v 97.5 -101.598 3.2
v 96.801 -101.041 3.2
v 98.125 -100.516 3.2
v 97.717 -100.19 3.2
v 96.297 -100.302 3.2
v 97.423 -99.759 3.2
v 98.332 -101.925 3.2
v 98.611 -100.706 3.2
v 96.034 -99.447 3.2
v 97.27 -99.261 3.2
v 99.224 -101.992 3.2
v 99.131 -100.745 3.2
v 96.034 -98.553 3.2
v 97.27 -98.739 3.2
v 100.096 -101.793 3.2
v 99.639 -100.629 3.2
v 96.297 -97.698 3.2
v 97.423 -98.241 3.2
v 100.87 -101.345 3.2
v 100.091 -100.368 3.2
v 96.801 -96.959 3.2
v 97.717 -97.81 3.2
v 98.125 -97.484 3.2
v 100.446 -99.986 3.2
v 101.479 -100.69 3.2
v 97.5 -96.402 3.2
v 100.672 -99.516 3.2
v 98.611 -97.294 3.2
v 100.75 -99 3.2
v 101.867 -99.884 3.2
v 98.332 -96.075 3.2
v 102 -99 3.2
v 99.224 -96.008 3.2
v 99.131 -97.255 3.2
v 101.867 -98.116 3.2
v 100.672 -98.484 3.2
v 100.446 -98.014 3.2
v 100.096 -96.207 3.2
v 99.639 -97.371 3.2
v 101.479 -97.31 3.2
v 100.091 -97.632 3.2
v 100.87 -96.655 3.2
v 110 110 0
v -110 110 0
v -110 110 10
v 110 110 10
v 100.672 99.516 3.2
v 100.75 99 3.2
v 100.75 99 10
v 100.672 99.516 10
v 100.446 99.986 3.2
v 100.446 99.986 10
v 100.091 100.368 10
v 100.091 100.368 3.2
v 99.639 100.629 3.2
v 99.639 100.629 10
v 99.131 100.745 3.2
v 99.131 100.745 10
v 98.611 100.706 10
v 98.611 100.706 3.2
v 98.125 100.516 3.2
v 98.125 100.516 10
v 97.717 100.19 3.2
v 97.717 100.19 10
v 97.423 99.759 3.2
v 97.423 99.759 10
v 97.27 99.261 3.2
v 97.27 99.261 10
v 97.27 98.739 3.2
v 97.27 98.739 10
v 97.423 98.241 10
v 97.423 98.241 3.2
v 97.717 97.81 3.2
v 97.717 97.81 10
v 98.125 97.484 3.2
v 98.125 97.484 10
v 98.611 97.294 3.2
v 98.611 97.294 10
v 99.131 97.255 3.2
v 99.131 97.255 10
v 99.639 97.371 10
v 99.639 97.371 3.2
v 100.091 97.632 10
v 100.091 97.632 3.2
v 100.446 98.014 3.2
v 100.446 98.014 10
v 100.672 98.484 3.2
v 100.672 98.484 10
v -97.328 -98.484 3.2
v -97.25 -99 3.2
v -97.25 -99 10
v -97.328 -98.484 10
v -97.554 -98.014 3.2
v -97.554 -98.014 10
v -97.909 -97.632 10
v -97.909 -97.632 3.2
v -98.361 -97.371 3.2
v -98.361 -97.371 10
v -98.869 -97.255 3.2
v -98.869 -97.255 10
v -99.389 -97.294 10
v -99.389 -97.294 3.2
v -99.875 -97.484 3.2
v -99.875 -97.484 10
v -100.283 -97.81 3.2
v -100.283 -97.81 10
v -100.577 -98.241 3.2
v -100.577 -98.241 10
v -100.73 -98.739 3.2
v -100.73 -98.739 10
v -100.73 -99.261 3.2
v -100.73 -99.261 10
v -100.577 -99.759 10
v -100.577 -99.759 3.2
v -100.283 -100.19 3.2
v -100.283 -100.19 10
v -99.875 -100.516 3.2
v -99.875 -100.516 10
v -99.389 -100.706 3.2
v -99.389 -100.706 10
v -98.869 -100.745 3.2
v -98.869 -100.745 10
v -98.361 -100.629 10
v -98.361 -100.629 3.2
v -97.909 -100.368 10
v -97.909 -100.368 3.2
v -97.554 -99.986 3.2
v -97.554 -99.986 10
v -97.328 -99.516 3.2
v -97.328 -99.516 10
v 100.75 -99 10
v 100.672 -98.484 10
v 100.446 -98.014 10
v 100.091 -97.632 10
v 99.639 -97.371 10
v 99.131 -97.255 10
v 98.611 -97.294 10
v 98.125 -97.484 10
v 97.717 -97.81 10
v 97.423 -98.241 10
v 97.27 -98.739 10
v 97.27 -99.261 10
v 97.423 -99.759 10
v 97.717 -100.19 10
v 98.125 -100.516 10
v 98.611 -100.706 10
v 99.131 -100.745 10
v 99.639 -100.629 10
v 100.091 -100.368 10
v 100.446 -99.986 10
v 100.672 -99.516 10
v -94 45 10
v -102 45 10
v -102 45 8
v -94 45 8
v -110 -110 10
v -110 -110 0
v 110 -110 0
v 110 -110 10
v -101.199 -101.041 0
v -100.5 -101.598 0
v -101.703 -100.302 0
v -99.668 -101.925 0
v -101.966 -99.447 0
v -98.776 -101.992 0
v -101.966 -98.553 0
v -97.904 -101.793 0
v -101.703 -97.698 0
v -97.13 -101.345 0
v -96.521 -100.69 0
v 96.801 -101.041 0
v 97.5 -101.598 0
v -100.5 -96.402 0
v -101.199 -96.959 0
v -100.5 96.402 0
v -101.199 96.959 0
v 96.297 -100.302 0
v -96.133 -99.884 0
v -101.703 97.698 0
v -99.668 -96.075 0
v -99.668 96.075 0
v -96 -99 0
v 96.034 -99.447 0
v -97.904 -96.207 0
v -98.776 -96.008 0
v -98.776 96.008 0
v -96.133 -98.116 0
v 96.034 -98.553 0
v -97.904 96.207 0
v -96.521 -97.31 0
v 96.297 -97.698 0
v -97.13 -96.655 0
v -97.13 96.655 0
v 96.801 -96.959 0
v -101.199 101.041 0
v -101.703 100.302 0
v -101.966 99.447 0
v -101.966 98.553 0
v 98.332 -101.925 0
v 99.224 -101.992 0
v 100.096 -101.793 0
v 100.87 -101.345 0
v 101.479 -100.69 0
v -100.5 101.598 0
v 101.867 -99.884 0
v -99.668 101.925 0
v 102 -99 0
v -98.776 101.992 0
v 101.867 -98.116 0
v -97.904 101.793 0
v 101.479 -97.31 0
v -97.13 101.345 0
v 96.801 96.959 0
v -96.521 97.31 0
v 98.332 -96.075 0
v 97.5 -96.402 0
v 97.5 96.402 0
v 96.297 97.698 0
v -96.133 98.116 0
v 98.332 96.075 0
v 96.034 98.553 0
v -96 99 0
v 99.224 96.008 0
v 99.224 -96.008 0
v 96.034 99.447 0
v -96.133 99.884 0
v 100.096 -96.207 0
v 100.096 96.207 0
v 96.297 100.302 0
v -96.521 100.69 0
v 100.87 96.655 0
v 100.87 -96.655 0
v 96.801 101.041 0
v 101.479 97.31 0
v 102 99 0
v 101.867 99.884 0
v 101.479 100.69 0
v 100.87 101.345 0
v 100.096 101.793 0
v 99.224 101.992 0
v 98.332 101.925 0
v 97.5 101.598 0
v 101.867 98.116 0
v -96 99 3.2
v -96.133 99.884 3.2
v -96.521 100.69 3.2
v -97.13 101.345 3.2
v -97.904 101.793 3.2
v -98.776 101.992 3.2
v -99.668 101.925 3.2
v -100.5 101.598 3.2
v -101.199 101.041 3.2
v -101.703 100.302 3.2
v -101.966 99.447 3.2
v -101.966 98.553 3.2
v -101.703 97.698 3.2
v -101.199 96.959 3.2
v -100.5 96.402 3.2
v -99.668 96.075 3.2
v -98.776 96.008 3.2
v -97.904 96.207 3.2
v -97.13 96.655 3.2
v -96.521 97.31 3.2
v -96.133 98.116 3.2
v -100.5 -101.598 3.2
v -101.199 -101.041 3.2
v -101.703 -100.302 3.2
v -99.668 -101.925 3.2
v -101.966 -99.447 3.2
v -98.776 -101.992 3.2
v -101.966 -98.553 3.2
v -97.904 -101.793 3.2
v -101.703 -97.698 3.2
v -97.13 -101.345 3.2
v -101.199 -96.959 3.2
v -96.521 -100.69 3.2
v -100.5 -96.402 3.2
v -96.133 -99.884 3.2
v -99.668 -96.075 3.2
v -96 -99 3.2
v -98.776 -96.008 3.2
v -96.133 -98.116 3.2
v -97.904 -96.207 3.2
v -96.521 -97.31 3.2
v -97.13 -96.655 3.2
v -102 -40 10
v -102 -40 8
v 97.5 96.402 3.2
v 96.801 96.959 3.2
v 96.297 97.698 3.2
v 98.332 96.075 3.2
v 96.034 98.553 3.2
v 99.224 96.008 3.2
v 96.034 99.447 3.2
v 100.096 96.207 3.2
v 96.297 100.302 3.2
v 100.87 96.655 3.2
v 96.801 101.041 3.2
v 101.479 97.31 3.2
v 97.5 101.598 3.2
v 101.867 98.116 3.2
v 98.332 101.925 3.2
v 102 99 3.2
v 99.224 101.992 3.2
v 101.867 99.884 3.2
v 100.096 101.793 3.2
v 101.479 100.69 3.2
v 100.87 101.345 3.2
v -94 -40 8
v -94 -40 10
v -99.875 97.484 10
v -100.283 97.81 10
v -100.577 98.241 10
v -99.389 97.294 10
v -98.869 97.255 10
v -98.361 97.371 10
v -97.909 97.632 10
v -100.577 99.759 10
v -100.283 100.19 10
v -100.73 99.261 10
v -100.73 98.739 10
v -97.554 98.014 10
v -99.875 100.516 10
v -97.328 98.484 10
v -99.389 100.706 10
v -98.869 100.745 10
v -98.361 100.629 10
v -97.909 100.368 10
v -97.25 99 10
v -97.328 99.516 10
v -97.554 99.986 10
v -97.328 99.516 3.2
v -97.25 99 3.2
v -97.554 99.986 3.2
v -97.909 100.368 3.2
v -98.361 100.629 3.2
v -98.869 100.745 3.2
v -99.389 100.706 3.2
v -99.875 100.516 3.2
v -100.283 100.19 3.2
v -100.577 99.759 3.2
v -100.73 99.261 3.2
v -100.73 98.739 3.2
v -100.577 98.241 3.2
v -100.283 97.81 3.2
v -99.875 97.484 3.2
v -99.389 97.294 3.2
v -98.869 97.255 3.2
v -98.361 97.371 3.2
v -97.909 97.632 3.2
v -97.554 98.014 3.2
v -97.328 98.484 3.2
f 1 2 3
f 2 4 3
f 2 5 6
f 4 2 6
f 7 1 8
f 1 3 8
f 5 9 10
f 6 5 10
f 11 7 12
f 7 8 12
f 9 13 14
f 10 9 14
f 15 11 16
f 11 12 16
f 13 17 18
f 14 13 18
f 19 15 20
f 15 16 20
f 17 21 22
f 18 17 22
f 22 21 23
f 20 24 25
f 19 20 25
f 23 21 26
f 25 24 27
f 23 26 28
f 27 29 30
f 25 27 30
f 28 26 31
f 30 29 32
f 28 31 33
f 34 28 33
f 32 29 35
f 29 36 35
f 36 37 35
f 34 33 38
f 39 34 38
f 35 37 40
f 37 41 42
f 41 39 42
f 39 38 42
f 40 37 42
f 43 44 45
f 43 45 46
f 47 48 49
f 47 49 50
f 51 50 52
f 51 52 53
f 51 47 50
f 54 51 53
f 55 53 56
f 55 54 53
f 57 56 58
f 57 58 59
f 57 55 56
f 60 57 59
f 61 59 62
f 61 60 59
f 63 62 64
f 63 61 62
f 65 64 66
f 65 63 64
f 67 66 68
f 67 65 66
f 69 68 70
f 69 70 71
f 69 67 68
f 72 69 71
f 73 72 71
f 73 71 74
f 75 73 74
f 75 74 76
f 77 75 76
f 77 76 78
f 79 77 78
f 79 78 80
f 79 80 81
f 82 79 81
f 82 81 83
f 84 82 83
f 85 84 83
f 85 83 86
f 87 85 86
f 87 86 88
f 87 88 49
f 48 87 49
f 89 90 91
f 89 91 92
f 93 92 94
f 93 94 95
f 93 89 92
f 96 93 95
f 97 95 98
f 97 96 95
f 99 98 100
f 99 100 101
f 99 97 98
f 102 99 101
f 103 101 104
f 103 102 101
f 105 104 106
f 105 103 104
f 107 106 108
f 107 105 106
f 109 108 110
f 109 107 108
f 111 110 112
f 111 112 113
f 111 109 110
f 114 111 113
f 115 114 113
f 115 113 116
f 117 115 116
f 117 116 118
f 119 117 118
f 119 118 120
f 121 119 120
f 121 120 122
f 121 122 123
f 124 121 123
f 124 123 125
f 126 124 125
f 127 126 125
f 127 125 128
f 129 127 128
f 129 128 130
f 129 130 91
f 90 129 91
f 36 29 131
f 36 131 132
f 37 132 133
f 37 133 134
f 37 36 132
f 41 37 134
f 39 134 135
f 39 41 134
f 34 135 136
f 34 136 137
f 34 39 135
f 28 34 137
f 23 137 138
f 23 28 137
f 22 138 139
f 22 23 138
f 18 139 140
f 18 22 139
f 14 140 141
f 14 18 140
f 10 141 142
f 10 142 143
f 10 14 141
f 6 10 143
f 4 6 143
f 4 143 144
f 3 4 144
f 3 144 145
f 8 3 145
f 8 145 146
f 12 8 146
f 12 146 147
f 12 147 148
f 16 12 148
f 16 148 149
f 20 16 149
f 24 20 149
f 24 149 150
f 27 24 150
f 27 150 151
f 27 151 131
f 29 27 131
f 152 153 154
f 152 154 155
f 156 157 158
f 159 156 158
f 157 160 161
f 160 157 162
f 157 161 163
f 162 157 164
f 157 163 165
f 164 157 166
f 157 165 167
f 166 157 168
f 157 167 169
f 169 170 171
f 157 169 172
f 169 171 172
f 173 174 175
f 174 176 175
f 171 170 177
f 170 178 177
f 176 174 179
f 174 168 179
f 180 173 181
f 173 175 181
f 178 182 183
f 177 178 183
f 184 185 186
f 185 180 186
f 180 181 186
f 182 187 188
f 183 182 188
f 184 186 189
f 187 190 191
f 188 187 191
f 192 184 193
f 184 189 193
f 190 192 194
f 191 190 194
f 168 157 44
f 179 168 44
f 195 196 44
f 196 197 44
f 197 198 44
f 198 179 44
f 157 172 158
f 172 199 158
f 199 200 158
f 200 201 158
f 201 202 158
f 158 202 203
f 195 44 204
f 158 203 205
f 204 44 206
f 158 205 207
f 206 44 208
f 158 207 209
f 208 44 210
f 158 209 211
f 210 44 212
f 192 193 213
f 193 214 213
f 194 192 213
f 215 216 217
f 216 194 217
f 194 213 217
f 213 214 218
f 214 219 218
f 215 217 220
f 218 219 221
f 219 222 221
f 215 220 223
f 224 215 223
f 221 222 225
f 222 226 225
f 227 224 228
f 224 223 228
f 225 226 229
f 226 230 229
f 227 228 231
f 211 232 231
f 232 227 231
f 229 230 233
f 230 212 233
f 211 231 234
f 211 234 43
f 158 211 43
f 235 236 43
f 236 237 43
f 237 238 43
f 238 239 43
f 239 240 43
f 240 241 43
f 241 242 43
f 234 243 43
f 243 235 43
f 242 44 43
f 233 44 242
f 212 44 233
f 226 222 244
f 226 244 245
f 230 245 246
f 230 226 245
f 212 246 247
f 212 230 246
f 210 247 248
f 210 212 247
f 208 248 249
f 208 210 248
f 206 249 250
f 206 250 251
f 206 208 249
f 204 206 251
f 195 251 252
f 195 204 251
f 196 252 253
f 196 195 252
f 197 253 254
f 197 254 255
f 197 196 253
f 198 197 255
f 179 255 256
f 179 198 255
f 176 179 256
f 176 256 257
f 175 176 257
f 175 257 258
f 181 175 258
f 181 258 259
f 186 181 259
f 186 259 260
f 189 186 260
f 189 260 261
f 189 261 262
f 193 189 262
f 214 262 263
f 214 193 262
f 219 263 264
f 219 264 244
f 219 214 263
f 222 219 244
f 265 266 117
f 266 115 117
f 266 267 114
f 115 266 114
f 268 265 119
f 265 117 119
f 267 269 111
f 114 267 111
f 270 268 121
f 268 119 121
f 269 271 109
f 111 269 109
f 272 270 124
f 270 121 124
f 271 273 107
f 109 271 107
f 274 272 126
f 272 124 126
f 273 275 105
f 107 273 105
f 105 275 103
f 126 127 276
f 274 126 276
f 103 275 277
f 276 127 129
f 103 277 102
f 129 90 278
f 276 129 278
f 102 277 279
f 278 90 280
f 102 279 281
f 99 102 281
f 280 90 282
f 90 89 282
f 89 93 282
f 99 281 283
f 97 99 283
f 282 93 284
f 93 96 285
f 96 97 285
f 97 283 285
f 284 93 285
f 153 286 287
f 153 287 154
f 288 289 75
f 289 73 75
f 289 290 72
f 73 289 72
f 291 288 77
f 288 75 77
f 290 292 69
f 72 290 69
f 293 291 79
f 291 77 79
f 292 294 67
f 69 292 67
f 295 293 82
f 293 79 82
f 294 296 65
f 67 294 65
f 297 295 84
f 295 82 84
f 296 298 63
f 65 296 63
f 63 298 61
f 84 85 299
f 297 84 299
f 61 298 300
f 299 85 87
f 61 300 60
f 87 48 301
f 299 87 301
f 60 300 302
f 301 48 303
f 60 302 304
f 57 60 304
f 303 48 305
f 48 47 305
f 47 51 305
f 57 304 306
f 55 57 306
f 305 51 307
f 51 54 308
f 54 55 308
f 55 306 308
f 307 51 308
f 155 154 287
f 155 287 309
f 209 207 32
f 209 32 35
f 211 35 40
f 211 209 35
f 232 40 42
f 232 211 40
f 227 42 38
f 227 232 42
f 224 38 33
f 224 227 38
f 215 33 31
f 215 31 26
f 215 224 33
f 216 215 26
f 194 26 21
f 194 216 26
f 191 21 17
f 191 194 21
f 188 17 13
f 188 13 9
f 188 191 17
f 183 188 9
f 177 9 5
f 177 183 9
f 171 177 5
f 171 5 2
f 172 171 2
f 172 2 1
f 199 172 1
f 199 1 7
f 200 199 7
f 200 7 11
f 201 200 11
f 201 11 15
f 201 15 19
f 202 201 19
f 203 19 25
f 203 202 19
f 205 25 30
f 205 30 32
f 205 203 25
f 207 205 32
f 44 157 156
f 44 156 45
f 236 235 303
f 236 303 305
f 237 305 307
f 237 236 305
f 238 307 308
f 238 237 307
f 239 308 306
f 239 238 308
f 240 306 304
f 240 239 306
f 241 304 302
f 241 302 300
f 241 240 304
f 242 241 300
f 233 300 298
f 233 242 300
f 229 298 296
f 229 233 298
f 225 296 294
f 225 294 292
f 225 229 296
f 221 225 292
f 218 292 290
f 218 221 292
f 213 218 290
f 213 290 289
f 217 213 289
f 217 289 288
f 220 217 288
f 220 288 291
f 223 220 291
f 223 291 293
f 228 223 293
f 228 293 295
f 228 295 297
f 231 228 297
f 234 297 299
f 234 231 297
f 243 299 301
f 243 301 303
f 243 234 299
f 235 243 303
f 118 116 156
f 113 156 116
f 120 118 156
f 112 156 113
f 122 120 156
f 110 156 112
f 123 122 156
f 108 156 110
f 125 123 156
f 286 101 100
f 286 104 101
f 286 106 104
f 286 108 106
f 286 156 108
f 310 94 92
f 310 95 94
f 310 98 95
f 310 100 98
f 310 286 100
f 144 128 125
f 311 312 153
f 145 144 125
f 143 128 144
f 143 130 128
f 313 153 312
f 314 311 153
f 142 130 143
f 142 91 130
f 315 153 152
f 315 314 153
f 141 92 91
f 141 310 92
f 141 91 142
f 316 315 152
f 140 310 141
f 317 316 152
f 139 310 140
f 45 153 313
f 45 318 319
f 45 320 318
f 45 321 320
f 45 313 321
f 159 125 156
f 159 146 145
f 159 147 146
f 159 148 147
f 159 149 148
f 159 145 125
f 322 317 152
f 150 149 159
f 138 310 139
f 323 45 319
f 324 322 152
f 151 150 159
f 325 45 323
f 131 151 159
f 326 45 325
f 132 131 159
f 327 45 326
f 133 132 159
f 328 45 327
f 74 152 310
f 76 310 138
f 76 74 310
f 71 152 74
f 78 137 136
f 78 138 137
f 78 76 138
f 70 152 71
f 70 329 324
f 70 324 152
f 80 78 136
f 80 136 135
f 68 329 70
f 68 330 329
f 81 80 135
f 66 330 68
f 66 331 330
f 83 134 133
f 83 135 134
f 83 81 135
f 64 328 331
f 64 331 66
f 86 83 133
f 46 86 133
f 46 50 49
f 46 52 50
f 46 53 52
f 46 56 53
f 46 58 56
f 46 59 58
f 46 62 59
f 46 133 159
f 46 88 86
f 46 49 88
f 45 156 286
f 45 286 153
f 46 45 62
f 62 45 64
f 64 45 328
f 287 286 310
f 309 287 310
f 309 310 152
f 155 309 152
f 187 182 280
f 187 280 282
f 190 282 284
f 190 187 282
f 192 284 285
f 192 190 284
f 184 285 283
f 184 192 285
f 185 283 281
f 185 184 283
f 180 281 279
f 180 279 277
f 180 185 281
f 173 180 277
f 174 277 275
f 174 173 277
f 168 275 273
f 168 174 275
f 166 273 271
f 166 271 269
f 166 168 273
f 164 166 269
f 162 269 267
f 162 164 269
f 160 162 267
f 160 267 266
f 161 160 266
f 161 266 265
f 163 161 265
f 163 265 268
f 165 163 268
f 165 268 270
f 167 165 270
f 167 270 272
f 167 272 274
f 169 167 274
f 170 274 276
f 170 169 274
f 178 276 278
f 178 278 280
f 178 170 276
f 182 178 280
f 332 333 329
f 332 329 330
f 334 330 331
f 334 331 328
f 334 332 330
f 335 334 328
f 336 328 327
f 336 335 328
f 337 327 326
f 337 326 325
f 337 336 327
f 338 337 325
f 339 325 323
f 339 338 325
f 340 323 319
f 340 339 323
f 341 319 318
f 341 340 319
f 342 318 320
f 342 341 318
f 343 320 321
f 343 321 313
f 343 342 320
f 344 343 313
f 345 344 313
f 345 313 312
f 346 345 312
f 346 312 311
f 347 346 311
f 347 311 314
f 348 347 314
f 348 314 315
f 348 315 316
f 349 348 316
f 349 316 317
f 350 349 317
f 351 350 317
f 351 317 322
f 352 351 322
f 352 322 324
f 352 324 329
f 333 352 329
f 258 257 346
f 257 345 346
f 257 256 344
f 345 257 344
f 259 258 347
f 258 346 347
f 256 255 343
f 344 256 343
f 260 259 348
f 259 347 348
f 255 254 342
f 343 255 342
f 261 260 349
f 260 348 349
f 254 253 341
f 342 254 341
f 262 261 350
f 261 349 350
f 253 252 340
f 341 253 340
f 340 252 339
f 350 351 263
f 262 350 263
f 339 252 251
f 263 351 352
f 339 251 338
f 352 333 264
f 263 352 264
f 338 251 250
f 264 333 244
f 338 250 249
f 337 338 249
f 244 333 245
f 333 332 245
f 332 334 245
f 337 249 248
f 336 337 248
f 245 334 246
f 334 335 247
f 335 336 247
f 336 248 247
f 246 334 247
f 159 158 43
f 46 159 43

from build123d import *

# Parameters (mm, degrees)
F0_W     = 220
F0_H     = 220
F0_R     = 3
F0_R_2   = 1.75
F1_DEPTH = 10
F2_DEPTH = 3.2
F3_W     = 8
F3_H     = 85
F4_DEPTH = 2


with BuildPart() as f1:
    # F0 (on Top) → F1 (new body)
    with BuildSketch(Plane.XY):
        Rectangle(F0_W, F0_H)
        with Locations((-99, -99)):
            Circle(F0_R, mode=Mode.SUBTRACT)
        with Locations((99, -99)):
            Circle(F0_R, mode=Mode.SUBTRACT)
        with Locations((-99, 99)):
            Circle(F0_R, mode=Mode.SUBTRACT)
        with Locations((99, 99)):
            Circle(F0_R, mode=Mode.SUBTRACT)
        with Locations((-99, 99)):
            Circle(F0_R)
        with Locations((-99, 99)):
            Circle(F0_R_2, mode=Mode.SUBTRACT)
        with Locations((99, 99)):
            Circle(F0_R)
        with Locations((99, 99)):
            Circle(F0_R_2, mode=Mode.SUBTRACT)
        with Locations((99, -99)):
            Circle(F0_R)
        with Locations((99, -99)):
            Circle(F0_R_2, mode=Mode.SUBTRACT)
        with Locations((-99, -99)):
            Circle(F0_R)
        with Locations((-99, -99)):
            Circle(F0_R_2, mode=Mode.SUBTRACT)
    extrude(amount=F1_DEPTH)

    # F0 (on Top) → F2 (cut)
    with BuildSketch(Plane.XY):
        with Locations((-99, -99)):
            Circle(F0_R)
        with Locations((-99, -99)):
            Circle(F0_R_2, mode=Mode.SUBTRACT)
        with Locations((99, -99)):
            Circle(F0_R)
        with Locations((99, -99)):
            Circle(F0_R_2, mode=Mode.SUBTRACT)
        with Locations((99, 99)):
            Circle(F0_R)
        with Locations((99, 99)):
            Circle(F0_R_2, mode=Mode.SUBTRACT)
        with Locations((-99, 99)):
            Circle(F0_R)
        with Locations((-99, 99)):
            Circle(F0_R_2, mode=Mode.SUBTRACT)
    extrude(amount=F2_DEPTH, mode=Mode.SUBTRACT)

    # F3 (on face) → F4 (cut)
    with BuildSketch(Plane.XY.offset(10)):
        with Locations((-98, 2.5)):
            Rectangle(F3_W, F3_H)
    extrude(amount=-F4_DEPTH, mode=Mode.SUBTRACT)


solid = f1.part
